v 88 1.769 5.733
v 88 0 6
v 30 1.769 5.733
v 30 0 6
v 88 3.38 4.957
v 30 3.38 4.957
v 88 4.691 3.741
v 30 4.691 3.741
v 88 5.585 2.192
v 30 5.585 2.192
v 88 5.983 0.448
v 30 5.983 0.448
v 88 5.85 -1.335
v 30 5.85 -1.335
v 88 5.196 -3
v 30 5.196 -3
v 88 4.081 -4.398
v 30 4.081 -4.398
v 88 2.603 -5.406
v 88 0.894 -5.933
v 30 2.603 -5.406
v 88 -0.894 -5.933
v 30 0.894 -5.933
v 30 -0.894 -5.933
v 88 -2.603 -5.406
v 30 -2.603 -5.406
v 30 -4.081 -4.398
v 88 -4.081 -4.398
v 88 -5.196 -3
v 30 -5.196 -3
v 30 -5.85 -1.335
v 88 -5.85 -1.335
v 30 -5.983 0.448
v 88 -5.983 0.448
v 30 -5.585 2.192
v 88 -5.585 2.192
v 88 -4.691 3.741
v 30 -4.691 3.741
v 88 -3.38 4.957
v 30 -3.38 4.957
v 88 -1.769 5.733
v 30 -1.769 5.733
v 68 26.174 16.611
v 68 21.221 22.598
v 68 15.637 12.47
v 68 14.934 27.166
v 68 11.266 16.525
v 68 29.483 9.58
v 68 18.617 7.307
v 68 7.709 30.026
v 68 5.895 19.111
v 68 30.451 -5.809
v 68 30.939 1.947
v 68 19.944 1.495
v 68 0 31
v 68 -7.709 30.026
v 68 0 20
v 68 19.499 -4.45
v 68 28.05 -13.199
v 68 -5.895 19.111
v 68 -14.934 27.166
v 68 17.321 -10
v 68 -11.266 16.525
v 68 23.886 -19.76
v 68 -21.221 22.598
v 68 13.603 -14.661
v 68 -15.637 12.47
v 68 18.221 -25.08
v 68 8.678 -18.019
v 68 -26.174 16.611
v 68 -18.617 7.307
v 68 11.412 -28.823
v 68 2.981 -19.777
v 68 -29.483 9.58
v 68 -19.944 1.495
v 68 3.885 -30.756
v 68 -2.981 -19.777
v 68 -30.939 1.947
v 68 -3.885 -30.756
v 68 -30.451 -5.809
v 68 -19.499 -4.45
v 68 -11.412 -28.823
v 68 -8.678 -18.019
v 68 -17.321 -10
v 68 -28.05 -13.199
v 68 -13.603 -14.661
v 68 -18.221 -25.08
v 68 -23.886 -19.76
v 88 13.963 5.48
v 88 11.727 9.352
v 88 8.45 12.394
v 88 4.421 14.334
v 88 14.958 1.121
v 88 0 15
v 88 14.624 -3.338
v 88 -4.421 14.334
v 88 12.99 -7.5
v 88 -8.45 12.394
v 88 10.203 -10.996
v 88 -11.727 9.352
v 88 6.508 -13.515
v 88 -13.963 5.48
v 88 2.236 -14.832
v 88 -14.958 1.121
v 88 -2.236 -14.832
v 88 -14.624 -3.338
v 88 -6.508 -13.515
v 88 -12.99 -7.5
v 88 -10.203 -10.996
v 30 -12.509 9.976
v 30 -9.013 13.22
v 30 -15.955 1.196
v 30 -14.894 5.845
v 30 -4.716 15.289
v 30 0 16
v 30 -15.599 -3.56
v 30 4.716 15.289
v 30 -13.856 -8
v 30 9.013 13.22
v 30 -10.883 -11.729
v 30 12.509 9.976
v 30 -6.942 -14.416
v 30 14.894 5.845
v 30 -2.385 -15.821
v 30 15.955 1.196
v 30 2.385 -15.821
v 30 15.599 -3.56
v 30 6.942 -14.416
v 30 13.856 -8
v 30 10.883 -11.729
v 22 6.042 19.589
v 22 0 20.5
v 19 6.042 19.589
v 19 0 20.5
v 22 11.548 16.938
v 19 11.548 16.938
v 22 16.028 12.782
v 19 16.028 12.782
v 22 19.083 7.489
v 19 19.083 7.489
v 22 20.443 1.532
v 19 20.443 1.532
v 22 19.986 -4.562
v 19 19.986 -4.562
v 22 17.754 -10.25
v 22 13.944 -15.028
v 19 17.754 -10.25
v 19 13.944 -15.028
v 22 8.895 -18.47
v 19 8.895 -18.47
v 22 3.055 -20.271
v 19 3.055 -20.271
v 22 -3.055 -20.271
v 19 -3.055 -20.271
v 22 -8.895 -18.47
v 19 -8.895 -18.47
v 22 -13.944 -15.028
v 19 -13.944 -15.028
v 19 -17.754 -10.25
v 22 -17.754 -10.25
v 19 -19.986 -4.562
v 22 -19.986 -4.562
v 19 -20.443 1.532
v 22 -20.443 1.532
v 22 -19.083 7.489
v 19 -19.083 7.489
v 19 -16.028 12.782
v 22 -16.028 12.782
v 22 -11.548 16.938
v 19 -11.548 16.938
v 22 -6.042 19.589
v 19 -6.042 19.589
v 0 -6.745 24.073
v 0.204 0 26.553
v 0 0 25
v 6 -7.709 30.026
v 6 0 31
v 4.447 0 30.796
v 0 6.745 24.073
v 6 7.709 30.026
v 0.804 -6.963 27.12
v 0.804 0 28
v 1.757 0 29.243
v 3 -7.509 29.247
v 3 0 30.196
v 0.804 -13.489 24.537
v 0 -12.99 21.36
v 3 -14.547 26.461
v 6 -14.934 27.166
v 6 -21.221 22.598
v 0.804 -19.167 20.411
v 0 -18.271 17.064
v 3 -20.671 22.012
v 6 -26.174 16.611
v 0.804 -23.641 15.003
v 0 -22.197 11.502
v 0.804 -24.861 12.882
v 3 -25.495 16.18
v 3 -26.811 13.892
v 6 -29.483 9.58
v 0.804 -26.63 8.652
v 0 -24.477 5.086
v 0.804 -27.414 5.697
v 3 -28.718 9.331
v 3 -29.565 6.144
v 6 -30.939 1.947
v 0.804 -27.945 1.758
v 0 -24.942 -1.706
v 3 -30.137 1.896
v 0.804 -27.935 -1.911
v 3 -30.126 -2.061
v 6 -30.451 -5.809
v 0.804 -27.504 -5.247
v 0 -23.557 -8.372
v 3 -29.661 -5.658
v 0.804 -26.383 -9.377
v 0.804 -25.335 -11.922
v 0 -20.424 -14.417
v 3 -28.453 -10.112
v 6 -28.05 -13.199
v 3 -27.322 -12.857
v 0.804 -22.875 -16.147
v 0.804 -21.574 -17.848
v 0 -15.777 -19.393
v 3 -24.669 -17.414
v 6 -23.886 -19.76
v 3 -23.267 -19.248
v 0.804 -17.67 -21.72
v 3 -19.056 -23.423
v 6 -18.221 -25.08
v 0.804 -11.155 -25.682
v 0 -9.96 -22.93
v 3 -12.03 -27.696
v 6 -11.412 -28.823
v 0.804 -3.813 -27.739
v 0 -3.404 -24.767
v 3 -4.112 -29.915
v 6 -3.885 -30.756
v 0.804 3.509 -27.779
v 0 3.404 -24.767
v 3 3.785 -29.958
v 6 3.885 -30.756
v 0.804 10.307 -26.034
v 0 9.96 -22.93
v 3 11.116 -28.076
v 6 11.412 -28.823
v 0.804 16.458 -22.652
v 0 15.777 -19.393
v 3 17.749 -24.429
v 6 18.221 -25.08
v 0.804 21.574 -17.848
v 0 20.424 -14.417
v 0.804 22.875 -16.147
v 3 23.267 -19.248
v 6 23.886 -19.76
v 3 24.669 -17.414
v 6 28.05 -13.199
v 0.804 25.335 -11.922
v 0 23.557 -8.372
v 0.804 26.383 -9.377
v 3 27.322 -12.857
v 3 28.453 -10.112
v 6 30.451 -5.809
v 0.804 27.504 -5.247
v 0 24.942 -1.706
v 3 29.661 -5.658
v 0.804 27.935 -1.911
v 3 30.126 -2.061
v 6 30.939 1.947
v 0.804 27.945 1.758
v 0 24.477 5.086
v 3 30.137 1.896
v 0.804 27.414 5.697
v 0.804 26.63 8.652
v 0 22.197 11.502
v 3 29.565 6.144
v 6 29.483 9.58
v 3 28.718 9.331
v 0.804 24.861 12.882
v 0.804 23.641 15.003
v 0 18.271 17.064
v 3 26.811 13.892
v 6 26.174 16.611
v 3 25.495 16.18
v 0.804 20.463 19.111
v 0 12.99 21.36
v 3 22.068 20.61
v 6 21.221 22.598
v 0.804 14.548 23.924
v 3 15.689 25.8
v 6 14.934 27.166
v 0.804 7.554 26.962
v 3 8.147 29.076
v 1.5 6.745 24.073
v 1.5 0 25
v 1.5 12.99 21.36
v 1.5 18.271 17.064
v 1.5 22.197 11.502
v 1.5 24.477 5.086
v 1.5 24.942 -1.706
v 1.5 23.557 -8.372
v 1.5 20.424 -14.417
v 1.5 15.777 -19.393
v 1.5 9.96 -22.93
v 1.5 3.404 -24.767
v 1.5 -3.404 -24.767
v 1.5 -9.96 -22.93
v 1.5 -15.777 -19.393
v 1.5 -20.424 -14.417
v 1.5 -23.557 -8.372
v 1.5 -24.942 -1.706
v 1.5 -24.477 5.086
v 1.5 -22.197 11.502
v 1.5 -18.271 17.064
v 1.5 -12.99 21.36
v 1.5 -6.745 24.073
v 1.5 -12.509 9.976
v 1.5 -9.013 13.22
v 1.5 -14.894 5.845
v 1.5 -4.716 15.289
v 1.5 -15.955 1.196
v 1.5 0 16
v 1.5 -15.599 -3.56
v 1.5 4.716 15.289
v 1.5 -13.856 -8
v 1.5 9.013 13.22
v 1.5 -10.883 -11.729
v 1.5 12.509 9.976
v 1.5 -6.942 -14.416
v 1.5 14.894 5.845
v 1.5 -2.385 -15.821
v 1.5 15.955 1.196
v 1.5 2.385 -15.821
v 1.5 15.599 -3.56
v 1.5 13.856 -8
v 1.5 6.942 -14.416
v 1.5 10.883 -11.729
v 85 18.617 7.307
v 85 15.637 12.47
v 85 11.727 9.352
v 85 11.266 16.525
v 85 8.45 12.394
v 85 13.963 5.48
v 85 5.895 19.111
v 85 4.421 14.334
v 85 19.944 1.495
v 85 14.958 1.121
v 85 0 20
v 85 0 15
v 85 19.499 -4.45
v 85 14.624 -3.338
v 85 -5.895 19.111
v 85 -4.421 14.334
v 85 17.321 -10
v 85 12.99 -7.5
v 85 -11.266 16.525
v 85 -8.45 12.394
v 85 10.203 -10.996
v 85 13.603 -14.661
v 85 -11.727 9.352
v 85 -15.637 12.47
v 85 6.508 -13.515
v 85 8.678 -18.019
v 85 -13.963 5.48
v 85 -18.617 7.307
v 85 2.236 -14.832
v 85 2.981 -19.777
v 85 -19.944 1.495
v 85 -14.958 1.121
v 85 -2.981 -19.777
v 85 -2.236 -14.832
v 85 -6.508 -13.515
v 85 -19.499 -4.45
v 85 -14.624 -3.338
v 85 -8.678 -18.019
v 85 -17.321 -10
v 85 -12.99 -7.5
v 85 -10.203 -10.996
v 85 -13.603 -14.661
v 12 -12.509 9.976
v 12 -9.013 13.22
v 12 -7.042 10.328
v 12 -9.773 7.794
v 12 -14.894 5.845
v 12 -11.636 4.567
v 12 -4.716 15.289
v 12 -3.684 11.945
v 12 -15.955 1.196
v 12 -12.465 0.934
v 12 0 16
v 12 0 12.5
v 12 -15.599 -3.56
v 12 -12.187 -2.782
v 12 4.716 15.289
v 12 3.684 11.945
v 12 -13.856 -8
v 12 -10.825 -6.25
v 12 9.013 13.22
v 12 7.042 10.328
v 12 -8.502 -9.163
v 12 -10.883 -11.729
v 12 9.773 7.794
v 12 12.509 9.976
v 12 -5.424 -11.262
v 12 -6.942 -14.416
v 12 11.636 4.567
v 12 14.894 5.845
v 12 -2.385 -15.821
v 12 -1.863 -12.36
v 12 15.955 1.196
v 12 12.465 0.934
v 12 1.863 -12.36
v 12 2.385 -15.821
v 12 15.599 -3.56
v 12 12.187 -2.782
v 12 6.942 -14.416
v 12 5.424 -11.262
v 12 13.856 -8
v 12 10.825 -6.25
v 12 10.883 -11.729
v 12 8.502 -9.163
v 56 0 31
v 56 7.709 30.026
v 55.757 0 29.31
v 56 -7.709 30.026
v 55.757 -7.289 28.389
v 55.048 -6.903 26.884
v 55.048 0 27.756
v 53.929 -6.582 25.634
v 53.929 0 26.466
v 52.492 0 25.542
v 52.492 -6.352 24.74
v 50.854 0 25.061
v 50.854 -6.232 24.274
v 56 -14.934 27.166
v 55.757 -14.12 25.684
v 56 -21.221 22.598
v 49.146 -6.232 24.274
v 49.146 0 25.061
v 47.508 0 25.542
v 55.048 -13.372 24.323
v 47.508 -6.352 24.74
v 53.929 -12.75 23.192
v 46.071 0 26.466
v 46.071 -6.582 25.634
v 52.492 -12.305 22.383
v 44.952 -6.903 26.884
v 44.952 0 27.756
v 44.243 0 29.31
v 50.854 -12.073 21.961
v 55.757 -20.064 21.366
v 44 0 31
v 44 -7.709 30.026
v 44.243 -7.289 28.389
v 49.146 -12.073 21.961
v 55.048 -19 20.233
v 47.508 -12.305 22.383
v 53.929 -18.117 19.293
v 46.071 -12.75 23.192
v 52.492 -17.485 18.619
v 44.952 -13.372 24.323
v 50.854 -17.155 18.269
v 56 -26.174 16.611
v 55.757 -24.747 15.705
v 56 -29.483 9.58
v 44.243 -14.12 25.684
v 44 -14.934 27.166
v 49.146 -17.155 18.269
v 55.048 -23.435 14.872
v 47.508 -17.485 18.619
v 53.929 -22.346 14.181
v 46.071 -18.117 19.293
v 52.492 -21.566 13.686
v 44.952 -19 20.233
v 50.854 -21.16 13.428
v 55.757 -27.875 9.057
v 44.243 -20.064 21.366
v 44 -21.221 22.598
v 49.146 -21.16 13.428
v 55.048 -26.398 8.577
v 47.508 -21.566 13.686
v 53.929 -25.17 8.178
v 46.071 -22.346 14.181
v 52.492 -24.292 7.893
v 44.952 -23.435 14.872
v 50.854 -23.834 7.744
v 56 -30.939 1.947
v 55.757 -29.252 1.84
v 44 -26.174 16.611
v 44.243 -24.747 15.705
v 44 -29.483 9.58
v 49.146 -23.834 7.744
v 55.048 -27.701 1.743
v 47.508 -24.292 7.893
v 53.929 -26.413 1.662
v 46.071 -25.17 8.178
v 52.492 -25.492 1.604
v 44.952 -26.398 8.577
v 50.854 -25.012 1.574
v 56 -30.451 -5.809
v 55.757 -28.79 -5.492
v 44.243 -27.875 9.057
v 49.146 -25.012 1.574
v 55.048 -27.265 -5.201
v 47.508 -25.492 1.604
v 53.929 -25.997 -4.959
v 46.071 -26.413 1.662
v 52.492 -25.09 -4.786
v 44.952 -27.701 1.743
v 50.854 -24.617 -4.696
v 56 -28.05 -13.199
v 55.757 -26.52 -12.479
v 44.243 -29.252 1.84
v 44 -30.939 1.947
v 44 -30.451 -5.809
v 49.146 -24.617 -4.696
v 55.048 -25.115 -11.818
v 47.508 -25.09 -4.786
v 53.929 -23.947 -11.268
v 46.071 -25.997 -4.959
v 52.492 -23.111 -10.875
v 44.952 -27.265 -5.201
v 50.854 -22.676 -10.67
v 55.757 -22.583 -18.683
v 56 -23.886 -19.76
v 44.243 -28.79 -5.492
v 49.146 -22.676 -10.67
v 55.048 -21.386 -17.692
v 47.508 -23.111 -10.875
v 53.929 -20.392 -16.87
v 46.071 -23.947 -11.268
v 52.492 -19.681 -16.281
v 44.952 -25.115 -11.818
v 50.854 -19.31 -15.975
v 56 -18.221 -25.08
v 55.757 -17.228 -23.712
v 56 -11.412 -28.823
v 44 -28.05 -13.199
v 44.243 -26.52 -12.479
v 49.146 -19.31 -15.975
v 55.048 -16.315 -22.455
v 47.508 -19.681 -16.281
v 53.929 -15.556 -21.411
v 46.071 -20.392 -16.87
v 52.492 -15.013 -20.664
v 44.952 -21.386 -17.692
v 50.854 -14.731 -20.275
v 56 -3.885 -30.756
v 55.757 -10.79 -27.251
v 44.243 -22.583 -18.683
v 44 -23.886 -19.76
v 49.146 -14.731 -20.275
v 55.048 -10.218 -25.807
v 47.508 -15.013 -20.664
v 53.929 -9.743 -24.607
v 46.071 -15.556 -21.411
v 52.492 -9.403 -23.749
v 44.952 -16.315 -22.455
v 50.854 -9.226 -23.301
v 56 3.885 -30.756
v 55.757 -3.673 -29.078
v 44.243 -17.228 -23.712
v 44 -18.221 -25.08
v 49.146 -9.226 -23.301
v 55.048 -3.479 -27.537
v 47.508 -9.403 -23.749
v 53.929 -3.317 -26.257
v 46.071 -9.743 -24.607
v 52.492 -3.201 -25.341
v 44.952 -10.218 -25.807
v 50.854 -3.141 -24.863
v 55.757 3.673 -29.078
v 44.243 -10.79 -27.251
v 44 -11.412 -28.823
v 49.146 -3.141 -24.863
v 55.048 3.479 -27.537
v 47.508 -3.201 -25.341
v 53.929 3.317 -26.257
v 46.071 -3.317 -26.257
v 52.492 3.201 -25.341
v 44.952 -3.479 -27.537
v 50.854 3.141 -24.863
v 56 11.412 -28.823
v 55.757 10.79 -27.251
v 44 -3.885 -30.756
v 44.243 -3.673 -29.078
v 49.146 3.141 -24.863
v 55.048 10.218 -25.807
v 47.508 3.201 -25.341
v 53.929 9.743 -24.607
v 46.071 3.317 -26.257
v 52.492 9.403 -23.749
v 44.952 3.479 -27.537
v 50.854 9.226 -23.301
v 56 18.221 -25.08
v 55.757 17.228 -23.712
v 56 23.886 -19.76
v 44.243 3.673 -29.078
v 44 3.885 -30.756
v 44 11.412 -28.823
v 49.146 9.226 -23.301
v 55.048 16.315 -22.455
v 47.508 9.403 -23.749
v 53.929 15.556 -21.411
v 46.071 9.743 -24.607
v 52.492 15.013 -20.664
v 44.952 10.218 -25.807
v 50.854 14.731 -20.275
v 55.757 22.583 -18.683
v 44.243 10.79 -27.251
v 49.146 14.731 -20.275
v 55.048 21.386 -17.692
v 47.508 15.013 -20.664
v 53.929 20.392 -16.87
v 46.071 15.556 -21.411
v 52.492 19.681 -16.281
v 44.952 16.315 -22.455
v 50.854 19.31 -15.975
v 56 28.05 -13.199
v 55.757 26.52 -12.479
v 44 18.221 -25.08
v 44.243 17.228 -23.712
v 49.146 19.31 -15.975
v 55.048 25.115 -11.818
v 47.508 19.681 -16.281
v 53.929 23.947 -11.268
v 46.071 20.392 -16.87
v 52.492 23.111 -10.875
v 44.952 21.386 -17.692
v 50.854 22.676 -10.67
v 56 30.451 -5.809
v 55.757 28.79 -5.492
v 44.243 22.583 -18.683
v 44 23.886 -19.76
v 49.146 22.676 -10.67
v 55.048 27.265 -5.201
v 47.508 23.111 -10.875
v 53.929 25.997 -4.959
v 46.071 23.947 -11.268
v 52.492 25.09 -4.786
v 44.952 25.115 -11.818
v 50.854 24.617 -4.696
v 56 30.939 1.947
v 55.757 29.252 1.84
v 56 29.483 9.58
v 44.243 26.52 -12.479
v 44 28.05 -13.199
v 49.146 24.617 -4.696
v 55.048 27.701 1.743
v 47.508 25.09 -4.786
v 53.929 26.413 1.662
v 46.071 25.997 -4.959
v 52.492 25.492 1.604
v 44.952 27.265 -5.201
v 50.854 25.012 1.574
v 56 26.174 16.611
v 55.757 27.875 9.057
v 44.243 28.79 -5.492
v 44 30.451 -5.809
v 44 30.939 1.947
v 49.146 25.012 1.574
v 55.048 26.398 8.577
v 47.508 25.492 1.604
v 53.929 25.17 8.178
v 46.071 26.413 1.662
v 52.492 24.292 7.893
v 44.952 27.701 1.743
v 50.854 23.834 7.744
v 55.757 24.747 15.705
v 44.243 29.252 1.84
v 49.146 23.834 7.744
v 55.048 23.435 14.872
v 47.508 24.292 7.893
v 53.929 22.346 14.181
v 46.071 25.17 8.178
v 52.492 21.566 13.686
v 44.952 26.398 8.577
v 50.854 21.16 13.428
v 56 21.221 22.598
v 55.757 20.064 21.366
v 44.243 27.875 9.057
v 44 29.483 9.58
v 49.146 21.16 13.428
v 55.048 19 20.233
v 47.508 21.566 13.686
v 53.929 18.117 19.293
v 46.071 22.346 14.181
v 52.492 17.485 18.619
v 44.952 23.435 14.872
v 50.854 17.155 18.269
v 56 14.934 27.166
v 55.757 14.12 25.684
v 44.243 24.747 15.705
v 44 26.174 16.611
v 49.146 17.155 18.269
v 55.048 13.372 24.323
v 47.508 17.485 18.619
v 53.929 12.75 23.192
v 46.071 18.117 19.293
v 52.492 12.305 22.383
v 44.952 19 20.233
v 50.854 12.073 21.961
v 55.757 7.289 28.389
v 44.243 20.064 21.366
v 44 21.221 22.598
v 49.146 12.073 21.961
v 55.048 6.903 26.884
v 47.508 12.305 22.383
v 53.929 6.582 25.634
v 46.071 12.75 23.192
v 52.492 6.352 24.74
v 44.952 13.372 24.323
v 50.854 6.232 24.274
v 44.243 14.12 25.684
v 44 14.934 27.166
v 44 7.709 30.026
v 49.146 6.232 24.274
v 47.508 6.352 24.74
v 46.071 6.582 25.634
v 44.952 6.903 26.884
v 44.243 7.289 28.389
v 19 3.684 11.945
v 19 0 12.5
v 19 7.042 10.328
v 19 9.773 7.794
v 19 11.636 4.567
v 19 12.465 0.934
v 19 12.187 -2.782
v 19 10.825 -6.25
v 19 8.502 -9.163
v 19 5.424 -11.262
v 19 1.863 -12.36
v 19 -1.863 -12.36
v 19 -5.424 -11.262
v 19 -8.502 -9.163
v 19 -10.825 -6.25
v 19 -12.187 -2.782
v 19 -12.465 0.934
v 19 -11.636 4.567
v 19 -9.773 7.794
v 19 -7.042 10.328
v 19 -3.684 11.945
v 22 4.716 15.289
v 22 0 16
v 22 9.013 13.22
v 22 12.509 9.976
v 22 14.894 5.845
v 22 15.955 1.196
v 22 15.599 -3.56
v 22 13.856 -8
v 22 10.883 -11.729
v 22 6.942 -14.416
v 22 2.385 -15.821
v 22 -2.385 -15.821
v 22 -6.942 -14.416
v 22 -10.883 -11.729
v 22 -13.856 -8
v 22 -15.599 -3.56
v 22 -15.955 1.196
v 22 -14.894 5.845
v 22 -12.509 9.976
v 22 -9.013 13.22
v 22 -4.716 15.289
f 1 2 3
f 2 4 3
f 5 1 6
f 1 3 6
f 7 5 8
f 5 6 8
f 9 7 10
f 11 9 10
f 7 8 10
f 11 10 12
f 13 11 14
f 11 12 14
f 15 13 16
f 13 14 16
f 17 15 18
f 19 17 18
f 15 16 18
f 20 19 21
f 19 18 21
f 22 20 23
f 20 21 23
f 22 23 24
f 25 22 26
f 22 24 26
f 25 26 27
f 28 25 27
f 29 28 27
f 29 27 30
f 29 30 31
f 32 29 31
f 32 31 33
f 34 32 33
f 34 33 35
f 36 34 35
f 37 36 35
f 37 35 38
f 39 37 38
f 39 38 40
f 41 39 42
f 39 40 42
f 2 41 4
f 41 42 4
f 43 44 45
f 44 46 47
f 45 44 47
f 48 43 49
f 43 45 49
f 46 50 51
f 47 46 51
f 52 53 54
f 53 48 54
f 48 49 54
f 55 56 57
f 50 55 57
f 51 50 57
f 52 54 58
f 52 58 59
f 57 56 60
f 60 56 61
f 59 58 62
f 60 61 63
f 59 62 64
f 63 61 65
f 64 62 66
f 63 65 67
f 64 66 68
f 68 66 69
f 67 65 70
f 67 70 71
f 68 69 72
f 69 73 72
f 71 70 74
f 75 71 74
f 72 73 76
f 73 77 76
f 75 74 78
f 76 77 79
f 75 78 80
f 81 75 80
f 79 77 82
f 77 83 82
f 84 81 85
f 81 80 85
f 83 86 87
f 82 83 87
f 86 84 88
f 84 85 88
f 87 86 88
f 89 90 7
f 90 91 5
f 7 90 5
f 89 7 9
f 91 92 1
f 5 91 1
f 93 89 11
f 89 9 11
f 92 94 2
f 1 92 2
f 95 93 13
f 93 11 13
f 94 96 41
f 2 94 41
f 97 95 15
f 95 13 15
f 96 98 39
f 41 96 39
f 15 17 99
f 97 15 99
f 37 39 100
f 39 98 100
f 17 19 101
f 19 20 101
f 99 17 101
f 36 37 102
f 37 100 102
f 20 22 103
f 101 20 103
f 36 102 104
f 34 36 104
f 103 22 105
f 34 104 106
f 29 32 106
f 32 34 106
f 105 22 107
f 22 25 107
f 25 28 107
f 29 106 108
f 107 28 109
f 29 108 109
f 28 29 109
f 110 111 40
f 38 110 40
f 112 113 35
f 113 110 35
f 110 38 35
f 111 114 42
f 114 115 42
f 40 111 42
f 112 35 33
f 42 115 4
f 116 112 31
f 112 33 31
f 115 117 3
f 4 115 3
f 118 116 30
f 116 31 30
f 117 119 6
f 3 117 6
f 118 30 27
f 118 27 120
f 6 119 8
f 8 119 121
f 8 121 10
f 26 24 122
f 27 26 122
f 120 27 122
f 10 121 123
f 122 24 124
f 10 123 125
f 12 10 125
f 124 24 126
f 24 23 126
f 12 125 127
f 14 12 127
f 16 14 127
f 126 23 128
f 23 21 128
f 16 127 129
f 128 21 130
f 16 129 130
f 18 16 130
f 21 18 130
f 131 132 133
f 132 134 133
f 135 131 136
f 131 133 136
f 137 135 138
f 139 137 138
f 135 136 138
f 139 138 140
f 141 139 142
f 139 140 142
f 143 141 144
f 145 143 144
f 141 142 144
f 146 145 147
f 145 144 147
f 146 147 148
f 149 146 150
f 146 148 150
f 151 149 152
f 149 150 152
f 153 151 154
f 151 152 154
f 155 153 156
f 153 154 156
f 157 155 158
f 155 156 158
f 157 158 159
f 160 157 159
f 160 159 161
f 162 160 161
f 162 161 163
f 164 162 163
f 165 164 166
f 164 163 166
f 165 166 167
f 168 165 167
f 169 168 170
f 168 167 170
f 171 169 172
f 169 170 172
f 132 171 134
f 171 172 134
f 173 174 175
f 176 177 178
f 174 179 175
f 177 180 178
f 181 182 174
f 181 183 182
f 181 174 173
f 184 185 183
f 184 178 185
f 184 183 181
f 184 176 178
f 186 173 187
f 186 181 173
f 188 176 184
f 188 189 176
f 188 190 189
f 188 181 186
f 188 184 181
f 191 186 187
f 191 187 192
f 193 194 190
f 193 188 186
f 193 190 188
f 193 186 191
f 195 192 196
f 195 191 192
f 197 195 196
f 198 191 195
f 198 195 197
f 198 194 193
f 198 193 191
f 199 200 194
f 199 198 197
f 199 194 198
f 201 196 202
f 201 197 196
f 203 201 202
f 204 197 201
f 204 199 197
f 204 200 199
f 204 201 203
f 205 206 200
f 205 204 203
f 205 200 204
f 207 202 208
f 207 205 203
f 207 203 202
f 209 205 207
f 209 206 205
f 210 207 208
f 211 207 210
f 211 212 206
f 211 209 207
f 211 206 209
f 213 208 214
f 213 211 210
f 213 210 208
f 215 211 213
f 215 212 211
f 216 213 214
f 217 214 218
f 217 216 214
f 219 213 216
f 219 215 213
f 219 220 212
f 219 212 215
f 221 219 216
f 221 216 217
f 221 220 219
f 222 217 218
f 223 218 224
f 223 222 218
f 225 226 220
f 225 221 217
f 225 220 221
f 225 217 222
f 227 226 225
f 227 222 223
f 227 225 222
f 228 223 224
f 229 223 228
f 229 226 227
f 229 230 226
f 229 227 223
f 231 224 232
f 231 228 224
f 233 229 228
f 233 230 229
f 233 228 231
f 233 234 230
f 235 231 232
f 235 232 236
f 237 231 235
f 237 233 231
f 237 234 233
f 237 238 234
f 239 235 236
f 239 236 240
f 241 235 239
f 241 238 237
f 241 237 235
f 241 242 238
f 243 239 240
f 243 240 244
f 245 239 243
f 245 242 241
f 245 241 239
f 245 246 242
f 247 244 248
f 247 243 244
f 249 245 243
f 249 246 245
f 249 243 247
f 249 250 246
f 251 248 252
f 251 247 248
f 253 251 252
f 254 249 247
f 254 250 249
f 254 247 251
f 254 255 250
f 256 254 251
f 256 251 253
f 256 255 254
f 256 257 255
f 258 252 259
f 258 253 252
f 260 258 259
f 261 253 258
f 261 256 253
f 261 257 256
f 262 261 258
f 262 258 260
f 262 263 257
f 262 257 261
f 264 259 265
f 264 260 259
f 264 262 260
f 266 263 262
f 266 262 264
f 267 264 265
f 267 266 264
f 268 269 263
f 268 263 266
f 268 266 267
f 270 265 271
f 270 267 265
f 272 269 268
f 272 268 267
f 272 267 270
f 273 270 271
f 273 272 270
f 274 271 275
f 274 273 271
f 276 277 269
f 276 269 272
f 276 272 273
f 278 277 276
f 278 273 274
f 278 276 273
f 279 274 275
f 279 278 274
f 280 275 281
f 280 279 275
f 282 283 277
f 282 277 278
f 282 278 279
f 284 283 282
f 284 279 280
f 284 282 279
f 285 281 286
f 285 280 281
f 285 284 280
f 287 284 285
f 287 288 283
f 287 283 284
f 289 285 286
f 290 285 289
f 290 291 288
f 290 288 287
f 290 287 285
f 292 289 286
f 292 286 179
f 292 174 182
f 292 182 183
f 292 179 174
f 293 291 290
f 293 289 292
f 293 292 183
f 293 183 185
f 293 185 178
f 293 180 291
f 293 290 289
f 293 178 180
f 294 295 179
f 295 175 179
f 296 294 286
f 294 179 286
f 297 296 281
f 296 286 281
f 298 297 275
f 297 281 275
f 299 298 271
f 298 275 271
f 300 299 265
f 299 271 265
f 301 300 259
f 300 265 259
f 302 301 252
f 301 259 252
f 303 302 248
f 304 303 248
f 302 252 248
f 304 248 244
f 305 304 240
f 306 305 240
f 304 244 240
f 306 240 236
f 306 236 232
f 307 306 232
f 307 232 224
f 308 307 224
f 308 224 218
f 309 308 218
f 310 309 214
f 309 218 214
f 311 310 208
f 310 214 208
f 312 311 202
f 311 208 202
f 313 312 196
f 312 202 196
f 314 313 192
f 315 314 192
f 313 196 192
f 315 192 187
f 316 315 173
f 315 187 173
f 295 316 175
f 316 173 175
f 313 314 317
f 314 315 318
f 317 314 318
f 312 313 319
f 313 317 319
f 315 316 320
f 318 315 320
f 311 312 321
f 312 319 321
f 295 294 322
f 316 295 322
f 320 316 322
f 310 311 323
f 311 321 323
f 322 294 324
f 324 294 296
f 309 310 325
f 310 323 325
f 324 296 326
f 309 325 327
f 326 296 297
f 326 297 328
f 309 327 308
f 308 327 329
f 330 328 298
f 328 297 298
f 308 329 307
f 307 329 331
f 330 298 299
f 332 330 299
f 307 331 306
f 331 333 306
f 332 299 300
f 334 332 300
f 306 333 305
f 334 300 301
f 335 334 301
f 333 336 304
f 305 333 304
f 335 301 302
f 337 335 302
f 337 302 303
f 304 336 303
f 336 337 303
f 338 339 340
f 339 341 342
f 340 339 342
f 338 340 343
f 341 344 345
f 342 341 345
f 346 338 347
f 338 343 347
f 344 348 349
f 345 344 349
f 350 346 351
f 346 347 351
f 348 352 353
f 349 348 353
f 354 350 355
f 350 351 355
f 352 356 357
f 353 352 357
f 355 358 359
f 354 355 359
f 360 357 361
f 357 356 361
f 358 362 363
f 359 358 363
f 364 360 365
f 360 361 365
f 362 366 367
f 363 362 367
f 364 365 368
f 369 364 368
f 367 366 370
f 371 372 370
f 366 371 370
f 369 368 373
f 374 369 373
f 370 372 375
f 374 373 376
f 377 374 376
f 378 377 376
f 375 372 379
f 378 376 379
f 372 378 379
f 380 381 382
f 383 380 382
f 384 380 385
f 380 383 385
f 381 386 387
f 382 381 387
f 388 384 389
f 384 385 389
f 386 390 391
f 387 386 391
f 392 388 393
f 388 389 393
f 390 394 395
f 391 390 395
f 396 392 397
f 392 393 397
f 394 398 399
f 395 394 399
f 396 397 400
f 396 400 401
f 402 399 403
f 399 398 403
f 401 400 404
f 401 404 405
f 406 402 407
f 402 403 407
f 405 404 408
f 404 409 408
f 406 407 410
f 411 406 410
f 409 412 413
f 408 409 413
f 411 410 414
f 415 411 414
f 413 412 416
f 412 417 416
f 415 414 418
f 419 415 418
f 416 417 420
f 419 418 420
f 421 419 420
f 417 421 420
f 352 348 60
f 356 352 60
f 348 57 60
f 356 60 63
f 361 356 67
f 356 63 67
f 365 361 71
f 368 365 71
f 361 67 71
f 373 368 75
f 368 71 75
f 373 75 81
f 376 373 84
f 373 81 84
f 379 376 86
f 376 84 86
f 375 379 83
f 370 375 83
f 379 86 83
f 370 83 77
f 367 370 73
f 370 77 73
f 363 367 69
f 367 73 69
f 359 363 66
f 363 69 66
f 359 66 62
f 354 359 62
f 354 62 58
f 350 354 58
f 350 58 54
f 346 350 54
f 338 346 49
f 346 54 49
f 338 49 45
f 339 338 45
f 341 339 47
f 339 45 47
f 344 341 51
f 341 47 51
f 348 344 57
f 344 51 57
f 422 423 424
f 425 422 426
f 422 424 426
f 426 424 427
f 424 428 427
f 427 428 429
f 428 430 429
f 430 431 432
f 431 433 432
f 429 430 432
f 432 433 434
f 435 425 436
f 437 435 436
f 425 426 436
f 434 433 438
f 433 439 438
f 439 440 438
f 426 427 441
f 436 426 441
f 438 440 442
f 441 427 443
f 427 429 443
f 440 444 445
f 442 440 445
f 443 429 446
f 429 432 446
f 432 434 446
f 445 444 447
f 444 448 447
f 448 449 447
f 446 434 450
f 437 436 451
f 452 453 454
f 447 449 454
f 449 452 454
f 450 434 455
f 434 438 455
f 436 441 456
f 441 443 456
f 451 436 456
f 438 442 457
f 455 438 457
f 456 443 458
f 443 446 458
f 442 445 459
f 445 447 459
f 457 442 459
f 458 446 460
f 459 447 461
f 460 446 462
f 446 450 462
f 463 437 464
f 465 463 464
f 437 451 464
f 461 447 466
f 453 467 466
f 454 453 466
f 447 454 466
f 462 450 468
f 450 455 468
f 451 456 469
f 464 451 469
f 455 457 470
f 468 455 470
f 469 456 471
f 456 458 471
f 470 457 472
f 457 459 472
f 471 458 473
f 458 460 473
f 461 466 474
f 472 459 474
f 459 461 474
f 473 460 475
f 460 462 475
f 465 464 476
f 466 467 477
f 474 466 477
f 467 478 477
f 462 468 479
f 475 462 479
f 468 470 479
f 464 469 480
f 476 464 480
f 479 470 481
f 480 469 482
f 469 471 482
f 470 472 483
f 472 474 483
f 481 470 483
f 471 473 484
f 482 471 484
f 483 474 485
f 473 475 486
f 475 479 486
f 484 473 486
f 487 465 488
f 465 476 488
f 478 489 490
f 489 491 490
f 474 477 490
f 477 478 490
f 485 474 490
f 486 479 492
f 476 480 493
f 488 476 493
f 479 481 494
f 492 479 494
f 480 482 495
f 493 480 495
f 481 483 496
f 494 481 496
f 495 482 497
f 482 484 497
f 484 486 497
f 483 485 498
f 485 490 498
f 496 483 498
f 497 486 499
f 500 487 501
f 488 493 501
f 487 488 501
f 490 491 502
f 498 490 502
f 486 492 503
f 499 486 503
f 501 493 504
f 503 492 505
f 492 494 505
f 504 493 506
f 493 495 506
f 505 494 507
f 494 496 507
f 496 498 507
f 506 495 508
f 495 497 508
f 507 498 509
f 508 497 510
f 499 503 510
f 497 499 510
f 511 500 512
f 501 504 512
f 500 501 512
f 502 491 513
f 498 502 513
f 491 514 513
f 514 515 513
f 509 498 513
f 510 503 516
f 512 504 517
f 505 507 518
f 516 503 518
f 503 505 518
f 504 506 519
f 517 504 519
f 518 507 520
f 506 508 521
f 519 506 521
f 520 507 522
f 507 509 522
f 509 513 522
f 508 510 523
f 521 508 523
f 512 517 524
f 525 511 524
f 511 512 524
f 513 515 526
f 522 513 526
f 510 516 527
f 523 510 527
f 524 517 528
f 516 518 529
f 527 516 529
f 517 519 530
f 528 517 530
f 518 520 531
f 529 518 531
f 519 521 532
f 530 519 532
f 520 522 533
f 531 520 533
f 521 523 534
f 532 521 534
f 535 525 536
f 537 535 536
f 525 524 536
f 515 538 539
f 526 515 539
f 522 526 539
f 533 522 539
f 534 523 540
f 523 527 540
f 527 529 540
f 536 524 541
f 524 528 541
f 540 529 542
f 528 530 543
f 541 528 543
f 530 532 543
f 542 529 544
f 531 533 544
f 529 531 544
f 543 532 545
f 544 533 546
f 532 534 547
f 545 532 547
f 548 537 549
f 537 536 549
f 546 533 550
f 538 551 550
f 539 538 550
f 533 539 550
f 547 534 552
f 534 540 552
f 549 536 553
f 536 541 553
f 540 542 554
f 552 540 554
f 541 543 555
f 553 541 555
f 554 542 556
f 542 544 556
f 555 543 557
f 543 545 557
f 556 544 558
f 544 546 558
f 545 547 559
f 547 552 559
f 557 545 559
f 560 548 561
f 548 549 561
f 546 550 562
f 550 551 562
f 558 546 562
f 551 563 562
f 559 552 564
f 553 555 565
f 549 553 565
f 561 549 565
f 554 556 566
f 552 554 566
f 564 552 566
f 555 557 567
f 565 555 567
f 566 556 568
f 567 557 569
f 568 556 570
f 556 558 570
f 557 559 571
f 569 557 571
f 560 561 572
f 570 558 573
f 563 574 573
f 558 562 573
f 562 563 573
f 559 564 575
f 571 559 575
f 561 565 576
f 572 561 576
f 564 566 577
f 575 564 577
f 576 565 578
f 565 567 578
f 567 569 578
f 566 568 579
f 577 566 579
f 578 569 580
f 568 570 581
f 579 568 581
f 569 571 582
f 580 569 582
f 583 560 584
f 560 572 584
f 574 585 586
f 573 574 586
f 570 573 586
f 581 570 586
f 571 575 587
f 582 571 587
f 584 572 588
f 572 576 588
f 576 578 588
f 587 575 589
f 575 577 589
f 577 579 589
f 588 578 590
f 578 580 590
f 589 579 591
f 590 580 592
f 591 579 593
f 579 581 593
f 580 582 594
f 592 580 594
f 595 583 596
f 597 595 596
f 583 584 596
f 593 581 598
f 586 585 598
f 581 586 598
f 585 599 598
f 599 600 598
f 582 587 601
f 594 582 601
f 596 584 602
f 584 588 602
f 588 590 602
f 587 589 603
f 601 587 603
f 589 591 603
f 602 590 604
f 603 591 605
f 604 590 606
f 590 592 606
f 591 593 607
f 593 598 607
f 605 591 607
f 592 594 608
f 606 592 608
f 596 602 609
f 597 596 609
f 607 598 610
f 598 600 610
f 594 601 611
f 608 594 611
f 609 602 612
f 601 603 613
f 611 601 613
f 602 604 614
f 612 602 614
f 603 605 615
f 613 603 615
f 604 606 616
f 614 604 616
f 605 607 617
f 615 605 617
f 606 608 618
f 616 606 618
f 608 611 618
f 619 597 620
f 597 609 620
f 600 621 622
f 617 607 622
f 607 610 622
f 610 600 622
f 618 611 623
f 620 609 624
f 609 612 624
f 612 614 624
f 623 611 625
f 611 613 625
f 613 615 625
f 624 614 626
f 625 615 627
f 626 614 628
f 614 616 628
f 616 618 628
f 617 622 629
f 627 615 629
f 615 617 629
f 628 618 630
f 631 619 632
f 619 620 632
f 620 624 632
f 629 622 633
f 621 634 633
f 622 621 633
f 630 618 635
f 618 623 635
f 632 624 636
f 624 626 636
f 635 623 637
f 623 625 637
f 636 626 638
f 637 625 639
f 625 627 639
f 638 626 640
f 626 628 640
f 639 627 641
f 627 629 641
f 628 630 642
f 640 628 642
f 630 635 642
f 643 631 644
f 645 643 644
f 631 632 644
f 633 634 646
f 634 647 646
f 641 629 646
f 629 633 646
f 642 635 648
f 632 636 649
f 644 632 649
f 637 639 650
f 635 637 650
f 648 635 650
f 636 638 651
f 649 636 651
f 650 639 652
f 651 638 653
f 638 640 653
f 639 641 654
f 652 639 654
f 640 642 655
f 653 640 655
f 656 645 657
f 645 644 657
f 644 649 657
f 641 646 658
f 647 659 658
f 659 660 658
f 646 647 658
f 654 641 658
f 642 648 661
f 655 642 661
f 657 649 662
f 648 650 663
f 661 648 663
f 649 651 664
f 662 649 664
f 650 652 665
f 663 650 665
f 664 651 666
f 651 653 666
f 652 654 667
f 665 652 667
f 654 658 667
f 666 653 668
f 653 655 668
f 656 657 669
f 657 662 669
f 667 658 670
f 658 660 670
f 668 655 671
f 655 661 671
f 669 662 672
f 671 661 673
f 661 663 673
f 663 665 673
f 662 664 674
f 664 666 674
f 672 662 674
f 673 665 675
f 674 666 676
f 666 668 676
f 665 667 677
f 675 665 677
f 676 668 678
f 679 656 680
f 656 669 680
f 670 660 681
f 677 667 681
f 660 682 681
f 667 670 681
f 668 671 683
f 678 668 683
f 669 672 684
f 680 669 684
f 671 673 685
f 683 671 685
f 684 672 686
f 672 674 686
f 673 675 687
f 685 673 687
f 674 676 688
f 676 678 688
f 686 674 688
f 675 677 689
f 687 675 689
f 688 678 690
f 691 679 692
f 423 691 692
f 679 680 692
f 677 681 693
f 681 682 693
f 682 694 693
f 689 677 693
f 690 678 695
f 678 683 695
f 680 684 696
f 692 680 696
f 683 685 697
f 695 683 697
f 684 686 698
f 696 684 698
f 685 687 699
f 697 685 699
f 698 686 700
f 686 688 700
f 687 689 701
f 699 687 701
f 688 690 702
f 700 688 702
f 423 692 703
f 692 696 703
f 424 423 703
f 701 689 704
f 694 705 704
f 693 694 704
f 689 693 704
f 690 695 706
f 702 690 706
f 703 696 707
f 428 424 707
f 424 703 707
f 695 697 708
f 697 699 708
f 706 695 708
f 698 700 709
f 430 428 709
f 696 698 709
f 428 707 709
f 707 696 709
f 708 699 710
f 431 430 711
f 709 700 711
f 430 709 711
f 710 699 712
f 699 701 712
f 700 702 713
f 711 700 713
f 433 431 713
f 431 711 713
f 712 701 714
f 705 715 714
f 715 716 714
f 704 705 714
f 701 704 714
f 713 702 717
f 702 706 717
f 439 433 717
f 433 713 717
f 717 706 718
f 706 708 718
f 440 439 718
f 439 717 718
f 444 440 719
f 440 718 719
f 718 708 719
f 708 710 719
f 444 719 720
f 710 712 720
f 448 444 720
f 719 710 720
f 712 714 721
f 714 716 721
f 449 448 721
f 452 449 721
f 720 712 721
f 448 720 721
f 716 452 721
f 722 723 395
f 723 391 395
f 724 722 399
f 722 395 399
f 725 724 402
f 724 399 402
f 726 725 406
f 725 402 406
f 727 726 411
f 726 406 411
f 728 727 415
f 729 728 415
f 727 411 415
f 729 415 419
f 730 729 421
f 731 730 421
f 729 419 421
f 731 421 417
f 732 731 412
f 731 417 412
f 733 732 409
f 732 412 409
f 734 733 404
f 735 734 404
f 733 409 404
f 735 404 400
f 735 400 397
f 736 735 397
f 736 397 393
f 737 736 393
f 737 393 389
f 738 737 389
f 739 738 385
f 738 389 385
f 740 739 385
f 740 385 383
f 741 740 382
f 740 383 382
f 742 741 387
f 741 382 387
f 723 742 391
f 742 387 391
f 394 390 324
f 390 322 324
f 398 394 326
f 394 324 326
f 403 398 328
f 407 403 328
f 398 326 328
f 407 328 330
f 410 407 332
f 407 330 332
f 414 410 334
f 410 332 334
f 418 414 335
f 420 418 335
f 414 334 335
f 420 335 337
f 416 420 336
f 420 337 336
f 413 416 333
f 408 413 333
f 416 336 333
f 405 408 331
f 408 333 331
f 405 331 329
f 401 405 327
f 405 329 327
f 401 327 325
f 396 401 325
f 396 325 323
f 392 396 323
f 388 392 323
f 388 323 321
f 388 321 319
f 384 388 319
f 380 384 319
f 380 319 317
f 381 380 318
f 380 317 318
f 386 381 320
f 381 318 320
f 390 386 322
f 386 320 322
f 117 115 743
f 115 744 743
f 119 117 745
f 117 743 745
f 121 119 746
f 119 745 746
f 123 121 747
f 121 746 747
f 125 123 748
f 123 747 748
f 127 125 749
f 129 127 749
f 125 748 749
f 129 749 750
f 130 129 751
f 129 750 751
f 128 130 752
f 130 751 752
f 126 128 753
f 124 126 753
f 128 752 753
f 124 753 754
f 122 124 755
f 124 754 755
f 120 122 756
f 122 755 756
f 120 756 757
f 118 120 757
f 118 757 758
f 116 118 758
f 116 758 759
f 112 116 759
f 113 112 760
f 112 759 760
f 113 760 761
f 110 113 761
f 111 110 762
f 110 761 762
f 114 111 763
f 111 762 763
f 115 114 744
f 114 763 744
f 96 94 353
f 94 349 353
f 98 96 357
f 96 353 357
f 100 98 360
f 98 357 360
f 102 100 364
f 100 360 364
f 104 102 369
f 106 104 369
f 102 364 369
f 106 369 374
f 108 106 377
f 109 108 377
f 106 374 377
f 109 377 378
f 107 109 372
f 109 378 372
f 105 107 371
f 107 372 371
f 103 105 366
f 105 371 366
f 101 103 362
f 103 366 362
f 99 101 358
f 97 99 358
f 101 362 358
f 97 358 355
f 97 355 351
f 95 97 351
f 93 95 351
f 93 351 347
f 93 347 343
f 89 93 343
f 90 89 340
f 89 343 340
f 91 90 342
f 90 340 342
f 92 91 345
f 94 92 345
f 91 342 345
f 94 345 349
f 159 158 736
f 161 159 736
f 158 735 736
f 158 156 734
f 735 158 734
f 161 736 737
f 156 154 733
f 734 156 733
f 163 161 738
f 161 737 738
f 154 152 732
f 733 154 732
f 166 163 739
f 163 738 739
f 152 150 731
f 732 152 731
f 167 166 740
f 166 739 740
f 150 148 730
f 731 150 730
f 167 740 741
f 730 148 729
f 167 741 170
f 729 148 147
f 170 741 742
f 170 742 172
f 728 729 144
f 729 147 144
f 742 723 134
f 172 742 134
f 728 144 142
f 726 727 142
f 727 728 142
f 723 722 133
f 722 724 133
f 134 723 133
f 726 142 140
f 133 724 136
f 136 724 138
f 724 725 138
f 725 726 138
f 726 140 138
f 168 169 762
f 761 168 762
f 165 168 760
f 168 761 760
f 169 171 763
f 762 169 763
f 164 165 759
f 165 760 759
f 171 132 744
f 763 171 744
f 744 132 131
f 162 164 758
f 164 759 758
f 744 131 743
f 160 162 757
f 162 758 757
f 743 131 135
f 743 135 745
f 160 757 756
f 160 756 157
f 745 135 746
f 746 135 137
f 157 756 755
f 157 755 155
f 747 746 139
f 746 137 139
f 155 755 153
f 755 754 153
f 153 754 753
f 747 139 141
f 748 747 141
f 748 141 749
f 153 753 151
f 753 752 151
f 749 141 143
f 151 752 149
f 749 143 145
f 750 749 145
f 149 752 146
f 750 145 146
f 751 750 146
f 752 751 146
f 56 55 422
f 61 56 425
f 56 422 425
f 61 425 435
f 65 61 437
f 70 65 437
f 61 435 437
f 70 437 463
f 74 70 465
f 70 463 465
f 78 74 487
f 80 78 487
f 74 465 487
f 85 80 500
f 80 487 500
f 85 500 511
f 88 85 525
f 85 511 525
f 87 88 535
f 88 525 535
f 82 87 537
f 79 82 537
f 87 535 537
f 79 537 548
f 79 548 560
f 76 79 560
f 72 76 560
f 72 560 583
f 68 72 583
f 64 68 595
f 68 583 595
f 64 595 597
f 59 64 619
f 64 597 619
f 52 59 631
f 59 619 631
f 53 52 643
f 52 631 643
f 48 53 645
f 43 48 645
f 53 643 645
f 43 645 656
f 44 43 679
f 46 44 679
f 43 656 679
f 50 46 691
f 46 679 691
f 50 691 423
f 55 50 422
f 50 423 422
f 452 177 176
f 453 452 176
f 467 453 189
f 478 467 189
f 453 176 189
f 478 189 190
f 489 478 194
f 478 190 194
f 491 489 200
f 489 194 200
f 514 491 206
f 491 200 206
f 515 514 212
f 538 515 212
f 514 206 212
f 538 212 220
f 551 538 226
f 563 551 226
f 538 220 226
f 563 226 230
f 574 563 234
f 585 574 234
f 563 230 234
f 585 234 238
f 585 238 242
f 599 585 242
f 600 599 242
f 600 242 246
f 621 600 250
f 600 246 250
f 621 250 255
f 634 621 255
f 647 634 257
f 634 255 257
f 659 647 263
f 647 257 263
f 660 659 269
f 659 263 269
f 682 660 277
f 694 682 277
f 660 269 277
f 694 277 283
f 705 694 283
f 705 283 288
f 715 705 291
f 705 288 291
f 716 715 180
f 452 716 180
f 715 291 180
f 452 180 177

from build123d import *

# Parameters (mm, degrees)
F4_R = 5.99999


# Not quite as in the source:
# - a fillet or chamfer is up to 0.001 mm smaller than in the source, because OpenCascade refuses the exact size


with BuildPart() as f1:
    # F0 (on Front) → F1 (revolve)
    with BuildSketch(Plane.XZ):
        with BuildLine():
            Line((0, 31), (0, 0))
            Line((0, 0), (88, 0))
            Line((88, 0), (88, 15))
            Line((88, 15), (85, 15))
            Line((85, 15), (85, 20))
            Line((85, 20), (68, 20))
            Line((68, 20), (68, 31))
            Line((68, 31), (56, 31))
            ThreePointArc((56, 31), (50, 25), (44, 31))
            Line((44, 31), (0, 31))
        make_face()
    revolve(axis=Axis((45.4589584282, 0, 0), (1, 0, 0)))

    # F2 (on Front) → F3 (revolve, cut)
    with BuildSketch(Plane.XZ):
        Polygon((0, 25), (0, 0), (88, 0), (88, 6), (30, 6), (30, 16), (22, 16), (22, 20.5), (19, 20.5), (19, 12.5), (12, 12.5), (12, 16), (1.5, 16), (1.5, 25), align=None)
    revolve(axis=Axis((-7.9182099137, 0, 0), (-1, 0, 0)), mode=Mode.SUBTRACT)

    # F4 (radius 6 in the source; OpenCascade refuses exactly that, so slightly less here)
    f4_edges = [f1.edges().sort_by_distance(p)[0] for p in [
        (0, 0, -31),
    ]]
    fillet(f4_edges, radius=F4_R)


solid = f1.part
